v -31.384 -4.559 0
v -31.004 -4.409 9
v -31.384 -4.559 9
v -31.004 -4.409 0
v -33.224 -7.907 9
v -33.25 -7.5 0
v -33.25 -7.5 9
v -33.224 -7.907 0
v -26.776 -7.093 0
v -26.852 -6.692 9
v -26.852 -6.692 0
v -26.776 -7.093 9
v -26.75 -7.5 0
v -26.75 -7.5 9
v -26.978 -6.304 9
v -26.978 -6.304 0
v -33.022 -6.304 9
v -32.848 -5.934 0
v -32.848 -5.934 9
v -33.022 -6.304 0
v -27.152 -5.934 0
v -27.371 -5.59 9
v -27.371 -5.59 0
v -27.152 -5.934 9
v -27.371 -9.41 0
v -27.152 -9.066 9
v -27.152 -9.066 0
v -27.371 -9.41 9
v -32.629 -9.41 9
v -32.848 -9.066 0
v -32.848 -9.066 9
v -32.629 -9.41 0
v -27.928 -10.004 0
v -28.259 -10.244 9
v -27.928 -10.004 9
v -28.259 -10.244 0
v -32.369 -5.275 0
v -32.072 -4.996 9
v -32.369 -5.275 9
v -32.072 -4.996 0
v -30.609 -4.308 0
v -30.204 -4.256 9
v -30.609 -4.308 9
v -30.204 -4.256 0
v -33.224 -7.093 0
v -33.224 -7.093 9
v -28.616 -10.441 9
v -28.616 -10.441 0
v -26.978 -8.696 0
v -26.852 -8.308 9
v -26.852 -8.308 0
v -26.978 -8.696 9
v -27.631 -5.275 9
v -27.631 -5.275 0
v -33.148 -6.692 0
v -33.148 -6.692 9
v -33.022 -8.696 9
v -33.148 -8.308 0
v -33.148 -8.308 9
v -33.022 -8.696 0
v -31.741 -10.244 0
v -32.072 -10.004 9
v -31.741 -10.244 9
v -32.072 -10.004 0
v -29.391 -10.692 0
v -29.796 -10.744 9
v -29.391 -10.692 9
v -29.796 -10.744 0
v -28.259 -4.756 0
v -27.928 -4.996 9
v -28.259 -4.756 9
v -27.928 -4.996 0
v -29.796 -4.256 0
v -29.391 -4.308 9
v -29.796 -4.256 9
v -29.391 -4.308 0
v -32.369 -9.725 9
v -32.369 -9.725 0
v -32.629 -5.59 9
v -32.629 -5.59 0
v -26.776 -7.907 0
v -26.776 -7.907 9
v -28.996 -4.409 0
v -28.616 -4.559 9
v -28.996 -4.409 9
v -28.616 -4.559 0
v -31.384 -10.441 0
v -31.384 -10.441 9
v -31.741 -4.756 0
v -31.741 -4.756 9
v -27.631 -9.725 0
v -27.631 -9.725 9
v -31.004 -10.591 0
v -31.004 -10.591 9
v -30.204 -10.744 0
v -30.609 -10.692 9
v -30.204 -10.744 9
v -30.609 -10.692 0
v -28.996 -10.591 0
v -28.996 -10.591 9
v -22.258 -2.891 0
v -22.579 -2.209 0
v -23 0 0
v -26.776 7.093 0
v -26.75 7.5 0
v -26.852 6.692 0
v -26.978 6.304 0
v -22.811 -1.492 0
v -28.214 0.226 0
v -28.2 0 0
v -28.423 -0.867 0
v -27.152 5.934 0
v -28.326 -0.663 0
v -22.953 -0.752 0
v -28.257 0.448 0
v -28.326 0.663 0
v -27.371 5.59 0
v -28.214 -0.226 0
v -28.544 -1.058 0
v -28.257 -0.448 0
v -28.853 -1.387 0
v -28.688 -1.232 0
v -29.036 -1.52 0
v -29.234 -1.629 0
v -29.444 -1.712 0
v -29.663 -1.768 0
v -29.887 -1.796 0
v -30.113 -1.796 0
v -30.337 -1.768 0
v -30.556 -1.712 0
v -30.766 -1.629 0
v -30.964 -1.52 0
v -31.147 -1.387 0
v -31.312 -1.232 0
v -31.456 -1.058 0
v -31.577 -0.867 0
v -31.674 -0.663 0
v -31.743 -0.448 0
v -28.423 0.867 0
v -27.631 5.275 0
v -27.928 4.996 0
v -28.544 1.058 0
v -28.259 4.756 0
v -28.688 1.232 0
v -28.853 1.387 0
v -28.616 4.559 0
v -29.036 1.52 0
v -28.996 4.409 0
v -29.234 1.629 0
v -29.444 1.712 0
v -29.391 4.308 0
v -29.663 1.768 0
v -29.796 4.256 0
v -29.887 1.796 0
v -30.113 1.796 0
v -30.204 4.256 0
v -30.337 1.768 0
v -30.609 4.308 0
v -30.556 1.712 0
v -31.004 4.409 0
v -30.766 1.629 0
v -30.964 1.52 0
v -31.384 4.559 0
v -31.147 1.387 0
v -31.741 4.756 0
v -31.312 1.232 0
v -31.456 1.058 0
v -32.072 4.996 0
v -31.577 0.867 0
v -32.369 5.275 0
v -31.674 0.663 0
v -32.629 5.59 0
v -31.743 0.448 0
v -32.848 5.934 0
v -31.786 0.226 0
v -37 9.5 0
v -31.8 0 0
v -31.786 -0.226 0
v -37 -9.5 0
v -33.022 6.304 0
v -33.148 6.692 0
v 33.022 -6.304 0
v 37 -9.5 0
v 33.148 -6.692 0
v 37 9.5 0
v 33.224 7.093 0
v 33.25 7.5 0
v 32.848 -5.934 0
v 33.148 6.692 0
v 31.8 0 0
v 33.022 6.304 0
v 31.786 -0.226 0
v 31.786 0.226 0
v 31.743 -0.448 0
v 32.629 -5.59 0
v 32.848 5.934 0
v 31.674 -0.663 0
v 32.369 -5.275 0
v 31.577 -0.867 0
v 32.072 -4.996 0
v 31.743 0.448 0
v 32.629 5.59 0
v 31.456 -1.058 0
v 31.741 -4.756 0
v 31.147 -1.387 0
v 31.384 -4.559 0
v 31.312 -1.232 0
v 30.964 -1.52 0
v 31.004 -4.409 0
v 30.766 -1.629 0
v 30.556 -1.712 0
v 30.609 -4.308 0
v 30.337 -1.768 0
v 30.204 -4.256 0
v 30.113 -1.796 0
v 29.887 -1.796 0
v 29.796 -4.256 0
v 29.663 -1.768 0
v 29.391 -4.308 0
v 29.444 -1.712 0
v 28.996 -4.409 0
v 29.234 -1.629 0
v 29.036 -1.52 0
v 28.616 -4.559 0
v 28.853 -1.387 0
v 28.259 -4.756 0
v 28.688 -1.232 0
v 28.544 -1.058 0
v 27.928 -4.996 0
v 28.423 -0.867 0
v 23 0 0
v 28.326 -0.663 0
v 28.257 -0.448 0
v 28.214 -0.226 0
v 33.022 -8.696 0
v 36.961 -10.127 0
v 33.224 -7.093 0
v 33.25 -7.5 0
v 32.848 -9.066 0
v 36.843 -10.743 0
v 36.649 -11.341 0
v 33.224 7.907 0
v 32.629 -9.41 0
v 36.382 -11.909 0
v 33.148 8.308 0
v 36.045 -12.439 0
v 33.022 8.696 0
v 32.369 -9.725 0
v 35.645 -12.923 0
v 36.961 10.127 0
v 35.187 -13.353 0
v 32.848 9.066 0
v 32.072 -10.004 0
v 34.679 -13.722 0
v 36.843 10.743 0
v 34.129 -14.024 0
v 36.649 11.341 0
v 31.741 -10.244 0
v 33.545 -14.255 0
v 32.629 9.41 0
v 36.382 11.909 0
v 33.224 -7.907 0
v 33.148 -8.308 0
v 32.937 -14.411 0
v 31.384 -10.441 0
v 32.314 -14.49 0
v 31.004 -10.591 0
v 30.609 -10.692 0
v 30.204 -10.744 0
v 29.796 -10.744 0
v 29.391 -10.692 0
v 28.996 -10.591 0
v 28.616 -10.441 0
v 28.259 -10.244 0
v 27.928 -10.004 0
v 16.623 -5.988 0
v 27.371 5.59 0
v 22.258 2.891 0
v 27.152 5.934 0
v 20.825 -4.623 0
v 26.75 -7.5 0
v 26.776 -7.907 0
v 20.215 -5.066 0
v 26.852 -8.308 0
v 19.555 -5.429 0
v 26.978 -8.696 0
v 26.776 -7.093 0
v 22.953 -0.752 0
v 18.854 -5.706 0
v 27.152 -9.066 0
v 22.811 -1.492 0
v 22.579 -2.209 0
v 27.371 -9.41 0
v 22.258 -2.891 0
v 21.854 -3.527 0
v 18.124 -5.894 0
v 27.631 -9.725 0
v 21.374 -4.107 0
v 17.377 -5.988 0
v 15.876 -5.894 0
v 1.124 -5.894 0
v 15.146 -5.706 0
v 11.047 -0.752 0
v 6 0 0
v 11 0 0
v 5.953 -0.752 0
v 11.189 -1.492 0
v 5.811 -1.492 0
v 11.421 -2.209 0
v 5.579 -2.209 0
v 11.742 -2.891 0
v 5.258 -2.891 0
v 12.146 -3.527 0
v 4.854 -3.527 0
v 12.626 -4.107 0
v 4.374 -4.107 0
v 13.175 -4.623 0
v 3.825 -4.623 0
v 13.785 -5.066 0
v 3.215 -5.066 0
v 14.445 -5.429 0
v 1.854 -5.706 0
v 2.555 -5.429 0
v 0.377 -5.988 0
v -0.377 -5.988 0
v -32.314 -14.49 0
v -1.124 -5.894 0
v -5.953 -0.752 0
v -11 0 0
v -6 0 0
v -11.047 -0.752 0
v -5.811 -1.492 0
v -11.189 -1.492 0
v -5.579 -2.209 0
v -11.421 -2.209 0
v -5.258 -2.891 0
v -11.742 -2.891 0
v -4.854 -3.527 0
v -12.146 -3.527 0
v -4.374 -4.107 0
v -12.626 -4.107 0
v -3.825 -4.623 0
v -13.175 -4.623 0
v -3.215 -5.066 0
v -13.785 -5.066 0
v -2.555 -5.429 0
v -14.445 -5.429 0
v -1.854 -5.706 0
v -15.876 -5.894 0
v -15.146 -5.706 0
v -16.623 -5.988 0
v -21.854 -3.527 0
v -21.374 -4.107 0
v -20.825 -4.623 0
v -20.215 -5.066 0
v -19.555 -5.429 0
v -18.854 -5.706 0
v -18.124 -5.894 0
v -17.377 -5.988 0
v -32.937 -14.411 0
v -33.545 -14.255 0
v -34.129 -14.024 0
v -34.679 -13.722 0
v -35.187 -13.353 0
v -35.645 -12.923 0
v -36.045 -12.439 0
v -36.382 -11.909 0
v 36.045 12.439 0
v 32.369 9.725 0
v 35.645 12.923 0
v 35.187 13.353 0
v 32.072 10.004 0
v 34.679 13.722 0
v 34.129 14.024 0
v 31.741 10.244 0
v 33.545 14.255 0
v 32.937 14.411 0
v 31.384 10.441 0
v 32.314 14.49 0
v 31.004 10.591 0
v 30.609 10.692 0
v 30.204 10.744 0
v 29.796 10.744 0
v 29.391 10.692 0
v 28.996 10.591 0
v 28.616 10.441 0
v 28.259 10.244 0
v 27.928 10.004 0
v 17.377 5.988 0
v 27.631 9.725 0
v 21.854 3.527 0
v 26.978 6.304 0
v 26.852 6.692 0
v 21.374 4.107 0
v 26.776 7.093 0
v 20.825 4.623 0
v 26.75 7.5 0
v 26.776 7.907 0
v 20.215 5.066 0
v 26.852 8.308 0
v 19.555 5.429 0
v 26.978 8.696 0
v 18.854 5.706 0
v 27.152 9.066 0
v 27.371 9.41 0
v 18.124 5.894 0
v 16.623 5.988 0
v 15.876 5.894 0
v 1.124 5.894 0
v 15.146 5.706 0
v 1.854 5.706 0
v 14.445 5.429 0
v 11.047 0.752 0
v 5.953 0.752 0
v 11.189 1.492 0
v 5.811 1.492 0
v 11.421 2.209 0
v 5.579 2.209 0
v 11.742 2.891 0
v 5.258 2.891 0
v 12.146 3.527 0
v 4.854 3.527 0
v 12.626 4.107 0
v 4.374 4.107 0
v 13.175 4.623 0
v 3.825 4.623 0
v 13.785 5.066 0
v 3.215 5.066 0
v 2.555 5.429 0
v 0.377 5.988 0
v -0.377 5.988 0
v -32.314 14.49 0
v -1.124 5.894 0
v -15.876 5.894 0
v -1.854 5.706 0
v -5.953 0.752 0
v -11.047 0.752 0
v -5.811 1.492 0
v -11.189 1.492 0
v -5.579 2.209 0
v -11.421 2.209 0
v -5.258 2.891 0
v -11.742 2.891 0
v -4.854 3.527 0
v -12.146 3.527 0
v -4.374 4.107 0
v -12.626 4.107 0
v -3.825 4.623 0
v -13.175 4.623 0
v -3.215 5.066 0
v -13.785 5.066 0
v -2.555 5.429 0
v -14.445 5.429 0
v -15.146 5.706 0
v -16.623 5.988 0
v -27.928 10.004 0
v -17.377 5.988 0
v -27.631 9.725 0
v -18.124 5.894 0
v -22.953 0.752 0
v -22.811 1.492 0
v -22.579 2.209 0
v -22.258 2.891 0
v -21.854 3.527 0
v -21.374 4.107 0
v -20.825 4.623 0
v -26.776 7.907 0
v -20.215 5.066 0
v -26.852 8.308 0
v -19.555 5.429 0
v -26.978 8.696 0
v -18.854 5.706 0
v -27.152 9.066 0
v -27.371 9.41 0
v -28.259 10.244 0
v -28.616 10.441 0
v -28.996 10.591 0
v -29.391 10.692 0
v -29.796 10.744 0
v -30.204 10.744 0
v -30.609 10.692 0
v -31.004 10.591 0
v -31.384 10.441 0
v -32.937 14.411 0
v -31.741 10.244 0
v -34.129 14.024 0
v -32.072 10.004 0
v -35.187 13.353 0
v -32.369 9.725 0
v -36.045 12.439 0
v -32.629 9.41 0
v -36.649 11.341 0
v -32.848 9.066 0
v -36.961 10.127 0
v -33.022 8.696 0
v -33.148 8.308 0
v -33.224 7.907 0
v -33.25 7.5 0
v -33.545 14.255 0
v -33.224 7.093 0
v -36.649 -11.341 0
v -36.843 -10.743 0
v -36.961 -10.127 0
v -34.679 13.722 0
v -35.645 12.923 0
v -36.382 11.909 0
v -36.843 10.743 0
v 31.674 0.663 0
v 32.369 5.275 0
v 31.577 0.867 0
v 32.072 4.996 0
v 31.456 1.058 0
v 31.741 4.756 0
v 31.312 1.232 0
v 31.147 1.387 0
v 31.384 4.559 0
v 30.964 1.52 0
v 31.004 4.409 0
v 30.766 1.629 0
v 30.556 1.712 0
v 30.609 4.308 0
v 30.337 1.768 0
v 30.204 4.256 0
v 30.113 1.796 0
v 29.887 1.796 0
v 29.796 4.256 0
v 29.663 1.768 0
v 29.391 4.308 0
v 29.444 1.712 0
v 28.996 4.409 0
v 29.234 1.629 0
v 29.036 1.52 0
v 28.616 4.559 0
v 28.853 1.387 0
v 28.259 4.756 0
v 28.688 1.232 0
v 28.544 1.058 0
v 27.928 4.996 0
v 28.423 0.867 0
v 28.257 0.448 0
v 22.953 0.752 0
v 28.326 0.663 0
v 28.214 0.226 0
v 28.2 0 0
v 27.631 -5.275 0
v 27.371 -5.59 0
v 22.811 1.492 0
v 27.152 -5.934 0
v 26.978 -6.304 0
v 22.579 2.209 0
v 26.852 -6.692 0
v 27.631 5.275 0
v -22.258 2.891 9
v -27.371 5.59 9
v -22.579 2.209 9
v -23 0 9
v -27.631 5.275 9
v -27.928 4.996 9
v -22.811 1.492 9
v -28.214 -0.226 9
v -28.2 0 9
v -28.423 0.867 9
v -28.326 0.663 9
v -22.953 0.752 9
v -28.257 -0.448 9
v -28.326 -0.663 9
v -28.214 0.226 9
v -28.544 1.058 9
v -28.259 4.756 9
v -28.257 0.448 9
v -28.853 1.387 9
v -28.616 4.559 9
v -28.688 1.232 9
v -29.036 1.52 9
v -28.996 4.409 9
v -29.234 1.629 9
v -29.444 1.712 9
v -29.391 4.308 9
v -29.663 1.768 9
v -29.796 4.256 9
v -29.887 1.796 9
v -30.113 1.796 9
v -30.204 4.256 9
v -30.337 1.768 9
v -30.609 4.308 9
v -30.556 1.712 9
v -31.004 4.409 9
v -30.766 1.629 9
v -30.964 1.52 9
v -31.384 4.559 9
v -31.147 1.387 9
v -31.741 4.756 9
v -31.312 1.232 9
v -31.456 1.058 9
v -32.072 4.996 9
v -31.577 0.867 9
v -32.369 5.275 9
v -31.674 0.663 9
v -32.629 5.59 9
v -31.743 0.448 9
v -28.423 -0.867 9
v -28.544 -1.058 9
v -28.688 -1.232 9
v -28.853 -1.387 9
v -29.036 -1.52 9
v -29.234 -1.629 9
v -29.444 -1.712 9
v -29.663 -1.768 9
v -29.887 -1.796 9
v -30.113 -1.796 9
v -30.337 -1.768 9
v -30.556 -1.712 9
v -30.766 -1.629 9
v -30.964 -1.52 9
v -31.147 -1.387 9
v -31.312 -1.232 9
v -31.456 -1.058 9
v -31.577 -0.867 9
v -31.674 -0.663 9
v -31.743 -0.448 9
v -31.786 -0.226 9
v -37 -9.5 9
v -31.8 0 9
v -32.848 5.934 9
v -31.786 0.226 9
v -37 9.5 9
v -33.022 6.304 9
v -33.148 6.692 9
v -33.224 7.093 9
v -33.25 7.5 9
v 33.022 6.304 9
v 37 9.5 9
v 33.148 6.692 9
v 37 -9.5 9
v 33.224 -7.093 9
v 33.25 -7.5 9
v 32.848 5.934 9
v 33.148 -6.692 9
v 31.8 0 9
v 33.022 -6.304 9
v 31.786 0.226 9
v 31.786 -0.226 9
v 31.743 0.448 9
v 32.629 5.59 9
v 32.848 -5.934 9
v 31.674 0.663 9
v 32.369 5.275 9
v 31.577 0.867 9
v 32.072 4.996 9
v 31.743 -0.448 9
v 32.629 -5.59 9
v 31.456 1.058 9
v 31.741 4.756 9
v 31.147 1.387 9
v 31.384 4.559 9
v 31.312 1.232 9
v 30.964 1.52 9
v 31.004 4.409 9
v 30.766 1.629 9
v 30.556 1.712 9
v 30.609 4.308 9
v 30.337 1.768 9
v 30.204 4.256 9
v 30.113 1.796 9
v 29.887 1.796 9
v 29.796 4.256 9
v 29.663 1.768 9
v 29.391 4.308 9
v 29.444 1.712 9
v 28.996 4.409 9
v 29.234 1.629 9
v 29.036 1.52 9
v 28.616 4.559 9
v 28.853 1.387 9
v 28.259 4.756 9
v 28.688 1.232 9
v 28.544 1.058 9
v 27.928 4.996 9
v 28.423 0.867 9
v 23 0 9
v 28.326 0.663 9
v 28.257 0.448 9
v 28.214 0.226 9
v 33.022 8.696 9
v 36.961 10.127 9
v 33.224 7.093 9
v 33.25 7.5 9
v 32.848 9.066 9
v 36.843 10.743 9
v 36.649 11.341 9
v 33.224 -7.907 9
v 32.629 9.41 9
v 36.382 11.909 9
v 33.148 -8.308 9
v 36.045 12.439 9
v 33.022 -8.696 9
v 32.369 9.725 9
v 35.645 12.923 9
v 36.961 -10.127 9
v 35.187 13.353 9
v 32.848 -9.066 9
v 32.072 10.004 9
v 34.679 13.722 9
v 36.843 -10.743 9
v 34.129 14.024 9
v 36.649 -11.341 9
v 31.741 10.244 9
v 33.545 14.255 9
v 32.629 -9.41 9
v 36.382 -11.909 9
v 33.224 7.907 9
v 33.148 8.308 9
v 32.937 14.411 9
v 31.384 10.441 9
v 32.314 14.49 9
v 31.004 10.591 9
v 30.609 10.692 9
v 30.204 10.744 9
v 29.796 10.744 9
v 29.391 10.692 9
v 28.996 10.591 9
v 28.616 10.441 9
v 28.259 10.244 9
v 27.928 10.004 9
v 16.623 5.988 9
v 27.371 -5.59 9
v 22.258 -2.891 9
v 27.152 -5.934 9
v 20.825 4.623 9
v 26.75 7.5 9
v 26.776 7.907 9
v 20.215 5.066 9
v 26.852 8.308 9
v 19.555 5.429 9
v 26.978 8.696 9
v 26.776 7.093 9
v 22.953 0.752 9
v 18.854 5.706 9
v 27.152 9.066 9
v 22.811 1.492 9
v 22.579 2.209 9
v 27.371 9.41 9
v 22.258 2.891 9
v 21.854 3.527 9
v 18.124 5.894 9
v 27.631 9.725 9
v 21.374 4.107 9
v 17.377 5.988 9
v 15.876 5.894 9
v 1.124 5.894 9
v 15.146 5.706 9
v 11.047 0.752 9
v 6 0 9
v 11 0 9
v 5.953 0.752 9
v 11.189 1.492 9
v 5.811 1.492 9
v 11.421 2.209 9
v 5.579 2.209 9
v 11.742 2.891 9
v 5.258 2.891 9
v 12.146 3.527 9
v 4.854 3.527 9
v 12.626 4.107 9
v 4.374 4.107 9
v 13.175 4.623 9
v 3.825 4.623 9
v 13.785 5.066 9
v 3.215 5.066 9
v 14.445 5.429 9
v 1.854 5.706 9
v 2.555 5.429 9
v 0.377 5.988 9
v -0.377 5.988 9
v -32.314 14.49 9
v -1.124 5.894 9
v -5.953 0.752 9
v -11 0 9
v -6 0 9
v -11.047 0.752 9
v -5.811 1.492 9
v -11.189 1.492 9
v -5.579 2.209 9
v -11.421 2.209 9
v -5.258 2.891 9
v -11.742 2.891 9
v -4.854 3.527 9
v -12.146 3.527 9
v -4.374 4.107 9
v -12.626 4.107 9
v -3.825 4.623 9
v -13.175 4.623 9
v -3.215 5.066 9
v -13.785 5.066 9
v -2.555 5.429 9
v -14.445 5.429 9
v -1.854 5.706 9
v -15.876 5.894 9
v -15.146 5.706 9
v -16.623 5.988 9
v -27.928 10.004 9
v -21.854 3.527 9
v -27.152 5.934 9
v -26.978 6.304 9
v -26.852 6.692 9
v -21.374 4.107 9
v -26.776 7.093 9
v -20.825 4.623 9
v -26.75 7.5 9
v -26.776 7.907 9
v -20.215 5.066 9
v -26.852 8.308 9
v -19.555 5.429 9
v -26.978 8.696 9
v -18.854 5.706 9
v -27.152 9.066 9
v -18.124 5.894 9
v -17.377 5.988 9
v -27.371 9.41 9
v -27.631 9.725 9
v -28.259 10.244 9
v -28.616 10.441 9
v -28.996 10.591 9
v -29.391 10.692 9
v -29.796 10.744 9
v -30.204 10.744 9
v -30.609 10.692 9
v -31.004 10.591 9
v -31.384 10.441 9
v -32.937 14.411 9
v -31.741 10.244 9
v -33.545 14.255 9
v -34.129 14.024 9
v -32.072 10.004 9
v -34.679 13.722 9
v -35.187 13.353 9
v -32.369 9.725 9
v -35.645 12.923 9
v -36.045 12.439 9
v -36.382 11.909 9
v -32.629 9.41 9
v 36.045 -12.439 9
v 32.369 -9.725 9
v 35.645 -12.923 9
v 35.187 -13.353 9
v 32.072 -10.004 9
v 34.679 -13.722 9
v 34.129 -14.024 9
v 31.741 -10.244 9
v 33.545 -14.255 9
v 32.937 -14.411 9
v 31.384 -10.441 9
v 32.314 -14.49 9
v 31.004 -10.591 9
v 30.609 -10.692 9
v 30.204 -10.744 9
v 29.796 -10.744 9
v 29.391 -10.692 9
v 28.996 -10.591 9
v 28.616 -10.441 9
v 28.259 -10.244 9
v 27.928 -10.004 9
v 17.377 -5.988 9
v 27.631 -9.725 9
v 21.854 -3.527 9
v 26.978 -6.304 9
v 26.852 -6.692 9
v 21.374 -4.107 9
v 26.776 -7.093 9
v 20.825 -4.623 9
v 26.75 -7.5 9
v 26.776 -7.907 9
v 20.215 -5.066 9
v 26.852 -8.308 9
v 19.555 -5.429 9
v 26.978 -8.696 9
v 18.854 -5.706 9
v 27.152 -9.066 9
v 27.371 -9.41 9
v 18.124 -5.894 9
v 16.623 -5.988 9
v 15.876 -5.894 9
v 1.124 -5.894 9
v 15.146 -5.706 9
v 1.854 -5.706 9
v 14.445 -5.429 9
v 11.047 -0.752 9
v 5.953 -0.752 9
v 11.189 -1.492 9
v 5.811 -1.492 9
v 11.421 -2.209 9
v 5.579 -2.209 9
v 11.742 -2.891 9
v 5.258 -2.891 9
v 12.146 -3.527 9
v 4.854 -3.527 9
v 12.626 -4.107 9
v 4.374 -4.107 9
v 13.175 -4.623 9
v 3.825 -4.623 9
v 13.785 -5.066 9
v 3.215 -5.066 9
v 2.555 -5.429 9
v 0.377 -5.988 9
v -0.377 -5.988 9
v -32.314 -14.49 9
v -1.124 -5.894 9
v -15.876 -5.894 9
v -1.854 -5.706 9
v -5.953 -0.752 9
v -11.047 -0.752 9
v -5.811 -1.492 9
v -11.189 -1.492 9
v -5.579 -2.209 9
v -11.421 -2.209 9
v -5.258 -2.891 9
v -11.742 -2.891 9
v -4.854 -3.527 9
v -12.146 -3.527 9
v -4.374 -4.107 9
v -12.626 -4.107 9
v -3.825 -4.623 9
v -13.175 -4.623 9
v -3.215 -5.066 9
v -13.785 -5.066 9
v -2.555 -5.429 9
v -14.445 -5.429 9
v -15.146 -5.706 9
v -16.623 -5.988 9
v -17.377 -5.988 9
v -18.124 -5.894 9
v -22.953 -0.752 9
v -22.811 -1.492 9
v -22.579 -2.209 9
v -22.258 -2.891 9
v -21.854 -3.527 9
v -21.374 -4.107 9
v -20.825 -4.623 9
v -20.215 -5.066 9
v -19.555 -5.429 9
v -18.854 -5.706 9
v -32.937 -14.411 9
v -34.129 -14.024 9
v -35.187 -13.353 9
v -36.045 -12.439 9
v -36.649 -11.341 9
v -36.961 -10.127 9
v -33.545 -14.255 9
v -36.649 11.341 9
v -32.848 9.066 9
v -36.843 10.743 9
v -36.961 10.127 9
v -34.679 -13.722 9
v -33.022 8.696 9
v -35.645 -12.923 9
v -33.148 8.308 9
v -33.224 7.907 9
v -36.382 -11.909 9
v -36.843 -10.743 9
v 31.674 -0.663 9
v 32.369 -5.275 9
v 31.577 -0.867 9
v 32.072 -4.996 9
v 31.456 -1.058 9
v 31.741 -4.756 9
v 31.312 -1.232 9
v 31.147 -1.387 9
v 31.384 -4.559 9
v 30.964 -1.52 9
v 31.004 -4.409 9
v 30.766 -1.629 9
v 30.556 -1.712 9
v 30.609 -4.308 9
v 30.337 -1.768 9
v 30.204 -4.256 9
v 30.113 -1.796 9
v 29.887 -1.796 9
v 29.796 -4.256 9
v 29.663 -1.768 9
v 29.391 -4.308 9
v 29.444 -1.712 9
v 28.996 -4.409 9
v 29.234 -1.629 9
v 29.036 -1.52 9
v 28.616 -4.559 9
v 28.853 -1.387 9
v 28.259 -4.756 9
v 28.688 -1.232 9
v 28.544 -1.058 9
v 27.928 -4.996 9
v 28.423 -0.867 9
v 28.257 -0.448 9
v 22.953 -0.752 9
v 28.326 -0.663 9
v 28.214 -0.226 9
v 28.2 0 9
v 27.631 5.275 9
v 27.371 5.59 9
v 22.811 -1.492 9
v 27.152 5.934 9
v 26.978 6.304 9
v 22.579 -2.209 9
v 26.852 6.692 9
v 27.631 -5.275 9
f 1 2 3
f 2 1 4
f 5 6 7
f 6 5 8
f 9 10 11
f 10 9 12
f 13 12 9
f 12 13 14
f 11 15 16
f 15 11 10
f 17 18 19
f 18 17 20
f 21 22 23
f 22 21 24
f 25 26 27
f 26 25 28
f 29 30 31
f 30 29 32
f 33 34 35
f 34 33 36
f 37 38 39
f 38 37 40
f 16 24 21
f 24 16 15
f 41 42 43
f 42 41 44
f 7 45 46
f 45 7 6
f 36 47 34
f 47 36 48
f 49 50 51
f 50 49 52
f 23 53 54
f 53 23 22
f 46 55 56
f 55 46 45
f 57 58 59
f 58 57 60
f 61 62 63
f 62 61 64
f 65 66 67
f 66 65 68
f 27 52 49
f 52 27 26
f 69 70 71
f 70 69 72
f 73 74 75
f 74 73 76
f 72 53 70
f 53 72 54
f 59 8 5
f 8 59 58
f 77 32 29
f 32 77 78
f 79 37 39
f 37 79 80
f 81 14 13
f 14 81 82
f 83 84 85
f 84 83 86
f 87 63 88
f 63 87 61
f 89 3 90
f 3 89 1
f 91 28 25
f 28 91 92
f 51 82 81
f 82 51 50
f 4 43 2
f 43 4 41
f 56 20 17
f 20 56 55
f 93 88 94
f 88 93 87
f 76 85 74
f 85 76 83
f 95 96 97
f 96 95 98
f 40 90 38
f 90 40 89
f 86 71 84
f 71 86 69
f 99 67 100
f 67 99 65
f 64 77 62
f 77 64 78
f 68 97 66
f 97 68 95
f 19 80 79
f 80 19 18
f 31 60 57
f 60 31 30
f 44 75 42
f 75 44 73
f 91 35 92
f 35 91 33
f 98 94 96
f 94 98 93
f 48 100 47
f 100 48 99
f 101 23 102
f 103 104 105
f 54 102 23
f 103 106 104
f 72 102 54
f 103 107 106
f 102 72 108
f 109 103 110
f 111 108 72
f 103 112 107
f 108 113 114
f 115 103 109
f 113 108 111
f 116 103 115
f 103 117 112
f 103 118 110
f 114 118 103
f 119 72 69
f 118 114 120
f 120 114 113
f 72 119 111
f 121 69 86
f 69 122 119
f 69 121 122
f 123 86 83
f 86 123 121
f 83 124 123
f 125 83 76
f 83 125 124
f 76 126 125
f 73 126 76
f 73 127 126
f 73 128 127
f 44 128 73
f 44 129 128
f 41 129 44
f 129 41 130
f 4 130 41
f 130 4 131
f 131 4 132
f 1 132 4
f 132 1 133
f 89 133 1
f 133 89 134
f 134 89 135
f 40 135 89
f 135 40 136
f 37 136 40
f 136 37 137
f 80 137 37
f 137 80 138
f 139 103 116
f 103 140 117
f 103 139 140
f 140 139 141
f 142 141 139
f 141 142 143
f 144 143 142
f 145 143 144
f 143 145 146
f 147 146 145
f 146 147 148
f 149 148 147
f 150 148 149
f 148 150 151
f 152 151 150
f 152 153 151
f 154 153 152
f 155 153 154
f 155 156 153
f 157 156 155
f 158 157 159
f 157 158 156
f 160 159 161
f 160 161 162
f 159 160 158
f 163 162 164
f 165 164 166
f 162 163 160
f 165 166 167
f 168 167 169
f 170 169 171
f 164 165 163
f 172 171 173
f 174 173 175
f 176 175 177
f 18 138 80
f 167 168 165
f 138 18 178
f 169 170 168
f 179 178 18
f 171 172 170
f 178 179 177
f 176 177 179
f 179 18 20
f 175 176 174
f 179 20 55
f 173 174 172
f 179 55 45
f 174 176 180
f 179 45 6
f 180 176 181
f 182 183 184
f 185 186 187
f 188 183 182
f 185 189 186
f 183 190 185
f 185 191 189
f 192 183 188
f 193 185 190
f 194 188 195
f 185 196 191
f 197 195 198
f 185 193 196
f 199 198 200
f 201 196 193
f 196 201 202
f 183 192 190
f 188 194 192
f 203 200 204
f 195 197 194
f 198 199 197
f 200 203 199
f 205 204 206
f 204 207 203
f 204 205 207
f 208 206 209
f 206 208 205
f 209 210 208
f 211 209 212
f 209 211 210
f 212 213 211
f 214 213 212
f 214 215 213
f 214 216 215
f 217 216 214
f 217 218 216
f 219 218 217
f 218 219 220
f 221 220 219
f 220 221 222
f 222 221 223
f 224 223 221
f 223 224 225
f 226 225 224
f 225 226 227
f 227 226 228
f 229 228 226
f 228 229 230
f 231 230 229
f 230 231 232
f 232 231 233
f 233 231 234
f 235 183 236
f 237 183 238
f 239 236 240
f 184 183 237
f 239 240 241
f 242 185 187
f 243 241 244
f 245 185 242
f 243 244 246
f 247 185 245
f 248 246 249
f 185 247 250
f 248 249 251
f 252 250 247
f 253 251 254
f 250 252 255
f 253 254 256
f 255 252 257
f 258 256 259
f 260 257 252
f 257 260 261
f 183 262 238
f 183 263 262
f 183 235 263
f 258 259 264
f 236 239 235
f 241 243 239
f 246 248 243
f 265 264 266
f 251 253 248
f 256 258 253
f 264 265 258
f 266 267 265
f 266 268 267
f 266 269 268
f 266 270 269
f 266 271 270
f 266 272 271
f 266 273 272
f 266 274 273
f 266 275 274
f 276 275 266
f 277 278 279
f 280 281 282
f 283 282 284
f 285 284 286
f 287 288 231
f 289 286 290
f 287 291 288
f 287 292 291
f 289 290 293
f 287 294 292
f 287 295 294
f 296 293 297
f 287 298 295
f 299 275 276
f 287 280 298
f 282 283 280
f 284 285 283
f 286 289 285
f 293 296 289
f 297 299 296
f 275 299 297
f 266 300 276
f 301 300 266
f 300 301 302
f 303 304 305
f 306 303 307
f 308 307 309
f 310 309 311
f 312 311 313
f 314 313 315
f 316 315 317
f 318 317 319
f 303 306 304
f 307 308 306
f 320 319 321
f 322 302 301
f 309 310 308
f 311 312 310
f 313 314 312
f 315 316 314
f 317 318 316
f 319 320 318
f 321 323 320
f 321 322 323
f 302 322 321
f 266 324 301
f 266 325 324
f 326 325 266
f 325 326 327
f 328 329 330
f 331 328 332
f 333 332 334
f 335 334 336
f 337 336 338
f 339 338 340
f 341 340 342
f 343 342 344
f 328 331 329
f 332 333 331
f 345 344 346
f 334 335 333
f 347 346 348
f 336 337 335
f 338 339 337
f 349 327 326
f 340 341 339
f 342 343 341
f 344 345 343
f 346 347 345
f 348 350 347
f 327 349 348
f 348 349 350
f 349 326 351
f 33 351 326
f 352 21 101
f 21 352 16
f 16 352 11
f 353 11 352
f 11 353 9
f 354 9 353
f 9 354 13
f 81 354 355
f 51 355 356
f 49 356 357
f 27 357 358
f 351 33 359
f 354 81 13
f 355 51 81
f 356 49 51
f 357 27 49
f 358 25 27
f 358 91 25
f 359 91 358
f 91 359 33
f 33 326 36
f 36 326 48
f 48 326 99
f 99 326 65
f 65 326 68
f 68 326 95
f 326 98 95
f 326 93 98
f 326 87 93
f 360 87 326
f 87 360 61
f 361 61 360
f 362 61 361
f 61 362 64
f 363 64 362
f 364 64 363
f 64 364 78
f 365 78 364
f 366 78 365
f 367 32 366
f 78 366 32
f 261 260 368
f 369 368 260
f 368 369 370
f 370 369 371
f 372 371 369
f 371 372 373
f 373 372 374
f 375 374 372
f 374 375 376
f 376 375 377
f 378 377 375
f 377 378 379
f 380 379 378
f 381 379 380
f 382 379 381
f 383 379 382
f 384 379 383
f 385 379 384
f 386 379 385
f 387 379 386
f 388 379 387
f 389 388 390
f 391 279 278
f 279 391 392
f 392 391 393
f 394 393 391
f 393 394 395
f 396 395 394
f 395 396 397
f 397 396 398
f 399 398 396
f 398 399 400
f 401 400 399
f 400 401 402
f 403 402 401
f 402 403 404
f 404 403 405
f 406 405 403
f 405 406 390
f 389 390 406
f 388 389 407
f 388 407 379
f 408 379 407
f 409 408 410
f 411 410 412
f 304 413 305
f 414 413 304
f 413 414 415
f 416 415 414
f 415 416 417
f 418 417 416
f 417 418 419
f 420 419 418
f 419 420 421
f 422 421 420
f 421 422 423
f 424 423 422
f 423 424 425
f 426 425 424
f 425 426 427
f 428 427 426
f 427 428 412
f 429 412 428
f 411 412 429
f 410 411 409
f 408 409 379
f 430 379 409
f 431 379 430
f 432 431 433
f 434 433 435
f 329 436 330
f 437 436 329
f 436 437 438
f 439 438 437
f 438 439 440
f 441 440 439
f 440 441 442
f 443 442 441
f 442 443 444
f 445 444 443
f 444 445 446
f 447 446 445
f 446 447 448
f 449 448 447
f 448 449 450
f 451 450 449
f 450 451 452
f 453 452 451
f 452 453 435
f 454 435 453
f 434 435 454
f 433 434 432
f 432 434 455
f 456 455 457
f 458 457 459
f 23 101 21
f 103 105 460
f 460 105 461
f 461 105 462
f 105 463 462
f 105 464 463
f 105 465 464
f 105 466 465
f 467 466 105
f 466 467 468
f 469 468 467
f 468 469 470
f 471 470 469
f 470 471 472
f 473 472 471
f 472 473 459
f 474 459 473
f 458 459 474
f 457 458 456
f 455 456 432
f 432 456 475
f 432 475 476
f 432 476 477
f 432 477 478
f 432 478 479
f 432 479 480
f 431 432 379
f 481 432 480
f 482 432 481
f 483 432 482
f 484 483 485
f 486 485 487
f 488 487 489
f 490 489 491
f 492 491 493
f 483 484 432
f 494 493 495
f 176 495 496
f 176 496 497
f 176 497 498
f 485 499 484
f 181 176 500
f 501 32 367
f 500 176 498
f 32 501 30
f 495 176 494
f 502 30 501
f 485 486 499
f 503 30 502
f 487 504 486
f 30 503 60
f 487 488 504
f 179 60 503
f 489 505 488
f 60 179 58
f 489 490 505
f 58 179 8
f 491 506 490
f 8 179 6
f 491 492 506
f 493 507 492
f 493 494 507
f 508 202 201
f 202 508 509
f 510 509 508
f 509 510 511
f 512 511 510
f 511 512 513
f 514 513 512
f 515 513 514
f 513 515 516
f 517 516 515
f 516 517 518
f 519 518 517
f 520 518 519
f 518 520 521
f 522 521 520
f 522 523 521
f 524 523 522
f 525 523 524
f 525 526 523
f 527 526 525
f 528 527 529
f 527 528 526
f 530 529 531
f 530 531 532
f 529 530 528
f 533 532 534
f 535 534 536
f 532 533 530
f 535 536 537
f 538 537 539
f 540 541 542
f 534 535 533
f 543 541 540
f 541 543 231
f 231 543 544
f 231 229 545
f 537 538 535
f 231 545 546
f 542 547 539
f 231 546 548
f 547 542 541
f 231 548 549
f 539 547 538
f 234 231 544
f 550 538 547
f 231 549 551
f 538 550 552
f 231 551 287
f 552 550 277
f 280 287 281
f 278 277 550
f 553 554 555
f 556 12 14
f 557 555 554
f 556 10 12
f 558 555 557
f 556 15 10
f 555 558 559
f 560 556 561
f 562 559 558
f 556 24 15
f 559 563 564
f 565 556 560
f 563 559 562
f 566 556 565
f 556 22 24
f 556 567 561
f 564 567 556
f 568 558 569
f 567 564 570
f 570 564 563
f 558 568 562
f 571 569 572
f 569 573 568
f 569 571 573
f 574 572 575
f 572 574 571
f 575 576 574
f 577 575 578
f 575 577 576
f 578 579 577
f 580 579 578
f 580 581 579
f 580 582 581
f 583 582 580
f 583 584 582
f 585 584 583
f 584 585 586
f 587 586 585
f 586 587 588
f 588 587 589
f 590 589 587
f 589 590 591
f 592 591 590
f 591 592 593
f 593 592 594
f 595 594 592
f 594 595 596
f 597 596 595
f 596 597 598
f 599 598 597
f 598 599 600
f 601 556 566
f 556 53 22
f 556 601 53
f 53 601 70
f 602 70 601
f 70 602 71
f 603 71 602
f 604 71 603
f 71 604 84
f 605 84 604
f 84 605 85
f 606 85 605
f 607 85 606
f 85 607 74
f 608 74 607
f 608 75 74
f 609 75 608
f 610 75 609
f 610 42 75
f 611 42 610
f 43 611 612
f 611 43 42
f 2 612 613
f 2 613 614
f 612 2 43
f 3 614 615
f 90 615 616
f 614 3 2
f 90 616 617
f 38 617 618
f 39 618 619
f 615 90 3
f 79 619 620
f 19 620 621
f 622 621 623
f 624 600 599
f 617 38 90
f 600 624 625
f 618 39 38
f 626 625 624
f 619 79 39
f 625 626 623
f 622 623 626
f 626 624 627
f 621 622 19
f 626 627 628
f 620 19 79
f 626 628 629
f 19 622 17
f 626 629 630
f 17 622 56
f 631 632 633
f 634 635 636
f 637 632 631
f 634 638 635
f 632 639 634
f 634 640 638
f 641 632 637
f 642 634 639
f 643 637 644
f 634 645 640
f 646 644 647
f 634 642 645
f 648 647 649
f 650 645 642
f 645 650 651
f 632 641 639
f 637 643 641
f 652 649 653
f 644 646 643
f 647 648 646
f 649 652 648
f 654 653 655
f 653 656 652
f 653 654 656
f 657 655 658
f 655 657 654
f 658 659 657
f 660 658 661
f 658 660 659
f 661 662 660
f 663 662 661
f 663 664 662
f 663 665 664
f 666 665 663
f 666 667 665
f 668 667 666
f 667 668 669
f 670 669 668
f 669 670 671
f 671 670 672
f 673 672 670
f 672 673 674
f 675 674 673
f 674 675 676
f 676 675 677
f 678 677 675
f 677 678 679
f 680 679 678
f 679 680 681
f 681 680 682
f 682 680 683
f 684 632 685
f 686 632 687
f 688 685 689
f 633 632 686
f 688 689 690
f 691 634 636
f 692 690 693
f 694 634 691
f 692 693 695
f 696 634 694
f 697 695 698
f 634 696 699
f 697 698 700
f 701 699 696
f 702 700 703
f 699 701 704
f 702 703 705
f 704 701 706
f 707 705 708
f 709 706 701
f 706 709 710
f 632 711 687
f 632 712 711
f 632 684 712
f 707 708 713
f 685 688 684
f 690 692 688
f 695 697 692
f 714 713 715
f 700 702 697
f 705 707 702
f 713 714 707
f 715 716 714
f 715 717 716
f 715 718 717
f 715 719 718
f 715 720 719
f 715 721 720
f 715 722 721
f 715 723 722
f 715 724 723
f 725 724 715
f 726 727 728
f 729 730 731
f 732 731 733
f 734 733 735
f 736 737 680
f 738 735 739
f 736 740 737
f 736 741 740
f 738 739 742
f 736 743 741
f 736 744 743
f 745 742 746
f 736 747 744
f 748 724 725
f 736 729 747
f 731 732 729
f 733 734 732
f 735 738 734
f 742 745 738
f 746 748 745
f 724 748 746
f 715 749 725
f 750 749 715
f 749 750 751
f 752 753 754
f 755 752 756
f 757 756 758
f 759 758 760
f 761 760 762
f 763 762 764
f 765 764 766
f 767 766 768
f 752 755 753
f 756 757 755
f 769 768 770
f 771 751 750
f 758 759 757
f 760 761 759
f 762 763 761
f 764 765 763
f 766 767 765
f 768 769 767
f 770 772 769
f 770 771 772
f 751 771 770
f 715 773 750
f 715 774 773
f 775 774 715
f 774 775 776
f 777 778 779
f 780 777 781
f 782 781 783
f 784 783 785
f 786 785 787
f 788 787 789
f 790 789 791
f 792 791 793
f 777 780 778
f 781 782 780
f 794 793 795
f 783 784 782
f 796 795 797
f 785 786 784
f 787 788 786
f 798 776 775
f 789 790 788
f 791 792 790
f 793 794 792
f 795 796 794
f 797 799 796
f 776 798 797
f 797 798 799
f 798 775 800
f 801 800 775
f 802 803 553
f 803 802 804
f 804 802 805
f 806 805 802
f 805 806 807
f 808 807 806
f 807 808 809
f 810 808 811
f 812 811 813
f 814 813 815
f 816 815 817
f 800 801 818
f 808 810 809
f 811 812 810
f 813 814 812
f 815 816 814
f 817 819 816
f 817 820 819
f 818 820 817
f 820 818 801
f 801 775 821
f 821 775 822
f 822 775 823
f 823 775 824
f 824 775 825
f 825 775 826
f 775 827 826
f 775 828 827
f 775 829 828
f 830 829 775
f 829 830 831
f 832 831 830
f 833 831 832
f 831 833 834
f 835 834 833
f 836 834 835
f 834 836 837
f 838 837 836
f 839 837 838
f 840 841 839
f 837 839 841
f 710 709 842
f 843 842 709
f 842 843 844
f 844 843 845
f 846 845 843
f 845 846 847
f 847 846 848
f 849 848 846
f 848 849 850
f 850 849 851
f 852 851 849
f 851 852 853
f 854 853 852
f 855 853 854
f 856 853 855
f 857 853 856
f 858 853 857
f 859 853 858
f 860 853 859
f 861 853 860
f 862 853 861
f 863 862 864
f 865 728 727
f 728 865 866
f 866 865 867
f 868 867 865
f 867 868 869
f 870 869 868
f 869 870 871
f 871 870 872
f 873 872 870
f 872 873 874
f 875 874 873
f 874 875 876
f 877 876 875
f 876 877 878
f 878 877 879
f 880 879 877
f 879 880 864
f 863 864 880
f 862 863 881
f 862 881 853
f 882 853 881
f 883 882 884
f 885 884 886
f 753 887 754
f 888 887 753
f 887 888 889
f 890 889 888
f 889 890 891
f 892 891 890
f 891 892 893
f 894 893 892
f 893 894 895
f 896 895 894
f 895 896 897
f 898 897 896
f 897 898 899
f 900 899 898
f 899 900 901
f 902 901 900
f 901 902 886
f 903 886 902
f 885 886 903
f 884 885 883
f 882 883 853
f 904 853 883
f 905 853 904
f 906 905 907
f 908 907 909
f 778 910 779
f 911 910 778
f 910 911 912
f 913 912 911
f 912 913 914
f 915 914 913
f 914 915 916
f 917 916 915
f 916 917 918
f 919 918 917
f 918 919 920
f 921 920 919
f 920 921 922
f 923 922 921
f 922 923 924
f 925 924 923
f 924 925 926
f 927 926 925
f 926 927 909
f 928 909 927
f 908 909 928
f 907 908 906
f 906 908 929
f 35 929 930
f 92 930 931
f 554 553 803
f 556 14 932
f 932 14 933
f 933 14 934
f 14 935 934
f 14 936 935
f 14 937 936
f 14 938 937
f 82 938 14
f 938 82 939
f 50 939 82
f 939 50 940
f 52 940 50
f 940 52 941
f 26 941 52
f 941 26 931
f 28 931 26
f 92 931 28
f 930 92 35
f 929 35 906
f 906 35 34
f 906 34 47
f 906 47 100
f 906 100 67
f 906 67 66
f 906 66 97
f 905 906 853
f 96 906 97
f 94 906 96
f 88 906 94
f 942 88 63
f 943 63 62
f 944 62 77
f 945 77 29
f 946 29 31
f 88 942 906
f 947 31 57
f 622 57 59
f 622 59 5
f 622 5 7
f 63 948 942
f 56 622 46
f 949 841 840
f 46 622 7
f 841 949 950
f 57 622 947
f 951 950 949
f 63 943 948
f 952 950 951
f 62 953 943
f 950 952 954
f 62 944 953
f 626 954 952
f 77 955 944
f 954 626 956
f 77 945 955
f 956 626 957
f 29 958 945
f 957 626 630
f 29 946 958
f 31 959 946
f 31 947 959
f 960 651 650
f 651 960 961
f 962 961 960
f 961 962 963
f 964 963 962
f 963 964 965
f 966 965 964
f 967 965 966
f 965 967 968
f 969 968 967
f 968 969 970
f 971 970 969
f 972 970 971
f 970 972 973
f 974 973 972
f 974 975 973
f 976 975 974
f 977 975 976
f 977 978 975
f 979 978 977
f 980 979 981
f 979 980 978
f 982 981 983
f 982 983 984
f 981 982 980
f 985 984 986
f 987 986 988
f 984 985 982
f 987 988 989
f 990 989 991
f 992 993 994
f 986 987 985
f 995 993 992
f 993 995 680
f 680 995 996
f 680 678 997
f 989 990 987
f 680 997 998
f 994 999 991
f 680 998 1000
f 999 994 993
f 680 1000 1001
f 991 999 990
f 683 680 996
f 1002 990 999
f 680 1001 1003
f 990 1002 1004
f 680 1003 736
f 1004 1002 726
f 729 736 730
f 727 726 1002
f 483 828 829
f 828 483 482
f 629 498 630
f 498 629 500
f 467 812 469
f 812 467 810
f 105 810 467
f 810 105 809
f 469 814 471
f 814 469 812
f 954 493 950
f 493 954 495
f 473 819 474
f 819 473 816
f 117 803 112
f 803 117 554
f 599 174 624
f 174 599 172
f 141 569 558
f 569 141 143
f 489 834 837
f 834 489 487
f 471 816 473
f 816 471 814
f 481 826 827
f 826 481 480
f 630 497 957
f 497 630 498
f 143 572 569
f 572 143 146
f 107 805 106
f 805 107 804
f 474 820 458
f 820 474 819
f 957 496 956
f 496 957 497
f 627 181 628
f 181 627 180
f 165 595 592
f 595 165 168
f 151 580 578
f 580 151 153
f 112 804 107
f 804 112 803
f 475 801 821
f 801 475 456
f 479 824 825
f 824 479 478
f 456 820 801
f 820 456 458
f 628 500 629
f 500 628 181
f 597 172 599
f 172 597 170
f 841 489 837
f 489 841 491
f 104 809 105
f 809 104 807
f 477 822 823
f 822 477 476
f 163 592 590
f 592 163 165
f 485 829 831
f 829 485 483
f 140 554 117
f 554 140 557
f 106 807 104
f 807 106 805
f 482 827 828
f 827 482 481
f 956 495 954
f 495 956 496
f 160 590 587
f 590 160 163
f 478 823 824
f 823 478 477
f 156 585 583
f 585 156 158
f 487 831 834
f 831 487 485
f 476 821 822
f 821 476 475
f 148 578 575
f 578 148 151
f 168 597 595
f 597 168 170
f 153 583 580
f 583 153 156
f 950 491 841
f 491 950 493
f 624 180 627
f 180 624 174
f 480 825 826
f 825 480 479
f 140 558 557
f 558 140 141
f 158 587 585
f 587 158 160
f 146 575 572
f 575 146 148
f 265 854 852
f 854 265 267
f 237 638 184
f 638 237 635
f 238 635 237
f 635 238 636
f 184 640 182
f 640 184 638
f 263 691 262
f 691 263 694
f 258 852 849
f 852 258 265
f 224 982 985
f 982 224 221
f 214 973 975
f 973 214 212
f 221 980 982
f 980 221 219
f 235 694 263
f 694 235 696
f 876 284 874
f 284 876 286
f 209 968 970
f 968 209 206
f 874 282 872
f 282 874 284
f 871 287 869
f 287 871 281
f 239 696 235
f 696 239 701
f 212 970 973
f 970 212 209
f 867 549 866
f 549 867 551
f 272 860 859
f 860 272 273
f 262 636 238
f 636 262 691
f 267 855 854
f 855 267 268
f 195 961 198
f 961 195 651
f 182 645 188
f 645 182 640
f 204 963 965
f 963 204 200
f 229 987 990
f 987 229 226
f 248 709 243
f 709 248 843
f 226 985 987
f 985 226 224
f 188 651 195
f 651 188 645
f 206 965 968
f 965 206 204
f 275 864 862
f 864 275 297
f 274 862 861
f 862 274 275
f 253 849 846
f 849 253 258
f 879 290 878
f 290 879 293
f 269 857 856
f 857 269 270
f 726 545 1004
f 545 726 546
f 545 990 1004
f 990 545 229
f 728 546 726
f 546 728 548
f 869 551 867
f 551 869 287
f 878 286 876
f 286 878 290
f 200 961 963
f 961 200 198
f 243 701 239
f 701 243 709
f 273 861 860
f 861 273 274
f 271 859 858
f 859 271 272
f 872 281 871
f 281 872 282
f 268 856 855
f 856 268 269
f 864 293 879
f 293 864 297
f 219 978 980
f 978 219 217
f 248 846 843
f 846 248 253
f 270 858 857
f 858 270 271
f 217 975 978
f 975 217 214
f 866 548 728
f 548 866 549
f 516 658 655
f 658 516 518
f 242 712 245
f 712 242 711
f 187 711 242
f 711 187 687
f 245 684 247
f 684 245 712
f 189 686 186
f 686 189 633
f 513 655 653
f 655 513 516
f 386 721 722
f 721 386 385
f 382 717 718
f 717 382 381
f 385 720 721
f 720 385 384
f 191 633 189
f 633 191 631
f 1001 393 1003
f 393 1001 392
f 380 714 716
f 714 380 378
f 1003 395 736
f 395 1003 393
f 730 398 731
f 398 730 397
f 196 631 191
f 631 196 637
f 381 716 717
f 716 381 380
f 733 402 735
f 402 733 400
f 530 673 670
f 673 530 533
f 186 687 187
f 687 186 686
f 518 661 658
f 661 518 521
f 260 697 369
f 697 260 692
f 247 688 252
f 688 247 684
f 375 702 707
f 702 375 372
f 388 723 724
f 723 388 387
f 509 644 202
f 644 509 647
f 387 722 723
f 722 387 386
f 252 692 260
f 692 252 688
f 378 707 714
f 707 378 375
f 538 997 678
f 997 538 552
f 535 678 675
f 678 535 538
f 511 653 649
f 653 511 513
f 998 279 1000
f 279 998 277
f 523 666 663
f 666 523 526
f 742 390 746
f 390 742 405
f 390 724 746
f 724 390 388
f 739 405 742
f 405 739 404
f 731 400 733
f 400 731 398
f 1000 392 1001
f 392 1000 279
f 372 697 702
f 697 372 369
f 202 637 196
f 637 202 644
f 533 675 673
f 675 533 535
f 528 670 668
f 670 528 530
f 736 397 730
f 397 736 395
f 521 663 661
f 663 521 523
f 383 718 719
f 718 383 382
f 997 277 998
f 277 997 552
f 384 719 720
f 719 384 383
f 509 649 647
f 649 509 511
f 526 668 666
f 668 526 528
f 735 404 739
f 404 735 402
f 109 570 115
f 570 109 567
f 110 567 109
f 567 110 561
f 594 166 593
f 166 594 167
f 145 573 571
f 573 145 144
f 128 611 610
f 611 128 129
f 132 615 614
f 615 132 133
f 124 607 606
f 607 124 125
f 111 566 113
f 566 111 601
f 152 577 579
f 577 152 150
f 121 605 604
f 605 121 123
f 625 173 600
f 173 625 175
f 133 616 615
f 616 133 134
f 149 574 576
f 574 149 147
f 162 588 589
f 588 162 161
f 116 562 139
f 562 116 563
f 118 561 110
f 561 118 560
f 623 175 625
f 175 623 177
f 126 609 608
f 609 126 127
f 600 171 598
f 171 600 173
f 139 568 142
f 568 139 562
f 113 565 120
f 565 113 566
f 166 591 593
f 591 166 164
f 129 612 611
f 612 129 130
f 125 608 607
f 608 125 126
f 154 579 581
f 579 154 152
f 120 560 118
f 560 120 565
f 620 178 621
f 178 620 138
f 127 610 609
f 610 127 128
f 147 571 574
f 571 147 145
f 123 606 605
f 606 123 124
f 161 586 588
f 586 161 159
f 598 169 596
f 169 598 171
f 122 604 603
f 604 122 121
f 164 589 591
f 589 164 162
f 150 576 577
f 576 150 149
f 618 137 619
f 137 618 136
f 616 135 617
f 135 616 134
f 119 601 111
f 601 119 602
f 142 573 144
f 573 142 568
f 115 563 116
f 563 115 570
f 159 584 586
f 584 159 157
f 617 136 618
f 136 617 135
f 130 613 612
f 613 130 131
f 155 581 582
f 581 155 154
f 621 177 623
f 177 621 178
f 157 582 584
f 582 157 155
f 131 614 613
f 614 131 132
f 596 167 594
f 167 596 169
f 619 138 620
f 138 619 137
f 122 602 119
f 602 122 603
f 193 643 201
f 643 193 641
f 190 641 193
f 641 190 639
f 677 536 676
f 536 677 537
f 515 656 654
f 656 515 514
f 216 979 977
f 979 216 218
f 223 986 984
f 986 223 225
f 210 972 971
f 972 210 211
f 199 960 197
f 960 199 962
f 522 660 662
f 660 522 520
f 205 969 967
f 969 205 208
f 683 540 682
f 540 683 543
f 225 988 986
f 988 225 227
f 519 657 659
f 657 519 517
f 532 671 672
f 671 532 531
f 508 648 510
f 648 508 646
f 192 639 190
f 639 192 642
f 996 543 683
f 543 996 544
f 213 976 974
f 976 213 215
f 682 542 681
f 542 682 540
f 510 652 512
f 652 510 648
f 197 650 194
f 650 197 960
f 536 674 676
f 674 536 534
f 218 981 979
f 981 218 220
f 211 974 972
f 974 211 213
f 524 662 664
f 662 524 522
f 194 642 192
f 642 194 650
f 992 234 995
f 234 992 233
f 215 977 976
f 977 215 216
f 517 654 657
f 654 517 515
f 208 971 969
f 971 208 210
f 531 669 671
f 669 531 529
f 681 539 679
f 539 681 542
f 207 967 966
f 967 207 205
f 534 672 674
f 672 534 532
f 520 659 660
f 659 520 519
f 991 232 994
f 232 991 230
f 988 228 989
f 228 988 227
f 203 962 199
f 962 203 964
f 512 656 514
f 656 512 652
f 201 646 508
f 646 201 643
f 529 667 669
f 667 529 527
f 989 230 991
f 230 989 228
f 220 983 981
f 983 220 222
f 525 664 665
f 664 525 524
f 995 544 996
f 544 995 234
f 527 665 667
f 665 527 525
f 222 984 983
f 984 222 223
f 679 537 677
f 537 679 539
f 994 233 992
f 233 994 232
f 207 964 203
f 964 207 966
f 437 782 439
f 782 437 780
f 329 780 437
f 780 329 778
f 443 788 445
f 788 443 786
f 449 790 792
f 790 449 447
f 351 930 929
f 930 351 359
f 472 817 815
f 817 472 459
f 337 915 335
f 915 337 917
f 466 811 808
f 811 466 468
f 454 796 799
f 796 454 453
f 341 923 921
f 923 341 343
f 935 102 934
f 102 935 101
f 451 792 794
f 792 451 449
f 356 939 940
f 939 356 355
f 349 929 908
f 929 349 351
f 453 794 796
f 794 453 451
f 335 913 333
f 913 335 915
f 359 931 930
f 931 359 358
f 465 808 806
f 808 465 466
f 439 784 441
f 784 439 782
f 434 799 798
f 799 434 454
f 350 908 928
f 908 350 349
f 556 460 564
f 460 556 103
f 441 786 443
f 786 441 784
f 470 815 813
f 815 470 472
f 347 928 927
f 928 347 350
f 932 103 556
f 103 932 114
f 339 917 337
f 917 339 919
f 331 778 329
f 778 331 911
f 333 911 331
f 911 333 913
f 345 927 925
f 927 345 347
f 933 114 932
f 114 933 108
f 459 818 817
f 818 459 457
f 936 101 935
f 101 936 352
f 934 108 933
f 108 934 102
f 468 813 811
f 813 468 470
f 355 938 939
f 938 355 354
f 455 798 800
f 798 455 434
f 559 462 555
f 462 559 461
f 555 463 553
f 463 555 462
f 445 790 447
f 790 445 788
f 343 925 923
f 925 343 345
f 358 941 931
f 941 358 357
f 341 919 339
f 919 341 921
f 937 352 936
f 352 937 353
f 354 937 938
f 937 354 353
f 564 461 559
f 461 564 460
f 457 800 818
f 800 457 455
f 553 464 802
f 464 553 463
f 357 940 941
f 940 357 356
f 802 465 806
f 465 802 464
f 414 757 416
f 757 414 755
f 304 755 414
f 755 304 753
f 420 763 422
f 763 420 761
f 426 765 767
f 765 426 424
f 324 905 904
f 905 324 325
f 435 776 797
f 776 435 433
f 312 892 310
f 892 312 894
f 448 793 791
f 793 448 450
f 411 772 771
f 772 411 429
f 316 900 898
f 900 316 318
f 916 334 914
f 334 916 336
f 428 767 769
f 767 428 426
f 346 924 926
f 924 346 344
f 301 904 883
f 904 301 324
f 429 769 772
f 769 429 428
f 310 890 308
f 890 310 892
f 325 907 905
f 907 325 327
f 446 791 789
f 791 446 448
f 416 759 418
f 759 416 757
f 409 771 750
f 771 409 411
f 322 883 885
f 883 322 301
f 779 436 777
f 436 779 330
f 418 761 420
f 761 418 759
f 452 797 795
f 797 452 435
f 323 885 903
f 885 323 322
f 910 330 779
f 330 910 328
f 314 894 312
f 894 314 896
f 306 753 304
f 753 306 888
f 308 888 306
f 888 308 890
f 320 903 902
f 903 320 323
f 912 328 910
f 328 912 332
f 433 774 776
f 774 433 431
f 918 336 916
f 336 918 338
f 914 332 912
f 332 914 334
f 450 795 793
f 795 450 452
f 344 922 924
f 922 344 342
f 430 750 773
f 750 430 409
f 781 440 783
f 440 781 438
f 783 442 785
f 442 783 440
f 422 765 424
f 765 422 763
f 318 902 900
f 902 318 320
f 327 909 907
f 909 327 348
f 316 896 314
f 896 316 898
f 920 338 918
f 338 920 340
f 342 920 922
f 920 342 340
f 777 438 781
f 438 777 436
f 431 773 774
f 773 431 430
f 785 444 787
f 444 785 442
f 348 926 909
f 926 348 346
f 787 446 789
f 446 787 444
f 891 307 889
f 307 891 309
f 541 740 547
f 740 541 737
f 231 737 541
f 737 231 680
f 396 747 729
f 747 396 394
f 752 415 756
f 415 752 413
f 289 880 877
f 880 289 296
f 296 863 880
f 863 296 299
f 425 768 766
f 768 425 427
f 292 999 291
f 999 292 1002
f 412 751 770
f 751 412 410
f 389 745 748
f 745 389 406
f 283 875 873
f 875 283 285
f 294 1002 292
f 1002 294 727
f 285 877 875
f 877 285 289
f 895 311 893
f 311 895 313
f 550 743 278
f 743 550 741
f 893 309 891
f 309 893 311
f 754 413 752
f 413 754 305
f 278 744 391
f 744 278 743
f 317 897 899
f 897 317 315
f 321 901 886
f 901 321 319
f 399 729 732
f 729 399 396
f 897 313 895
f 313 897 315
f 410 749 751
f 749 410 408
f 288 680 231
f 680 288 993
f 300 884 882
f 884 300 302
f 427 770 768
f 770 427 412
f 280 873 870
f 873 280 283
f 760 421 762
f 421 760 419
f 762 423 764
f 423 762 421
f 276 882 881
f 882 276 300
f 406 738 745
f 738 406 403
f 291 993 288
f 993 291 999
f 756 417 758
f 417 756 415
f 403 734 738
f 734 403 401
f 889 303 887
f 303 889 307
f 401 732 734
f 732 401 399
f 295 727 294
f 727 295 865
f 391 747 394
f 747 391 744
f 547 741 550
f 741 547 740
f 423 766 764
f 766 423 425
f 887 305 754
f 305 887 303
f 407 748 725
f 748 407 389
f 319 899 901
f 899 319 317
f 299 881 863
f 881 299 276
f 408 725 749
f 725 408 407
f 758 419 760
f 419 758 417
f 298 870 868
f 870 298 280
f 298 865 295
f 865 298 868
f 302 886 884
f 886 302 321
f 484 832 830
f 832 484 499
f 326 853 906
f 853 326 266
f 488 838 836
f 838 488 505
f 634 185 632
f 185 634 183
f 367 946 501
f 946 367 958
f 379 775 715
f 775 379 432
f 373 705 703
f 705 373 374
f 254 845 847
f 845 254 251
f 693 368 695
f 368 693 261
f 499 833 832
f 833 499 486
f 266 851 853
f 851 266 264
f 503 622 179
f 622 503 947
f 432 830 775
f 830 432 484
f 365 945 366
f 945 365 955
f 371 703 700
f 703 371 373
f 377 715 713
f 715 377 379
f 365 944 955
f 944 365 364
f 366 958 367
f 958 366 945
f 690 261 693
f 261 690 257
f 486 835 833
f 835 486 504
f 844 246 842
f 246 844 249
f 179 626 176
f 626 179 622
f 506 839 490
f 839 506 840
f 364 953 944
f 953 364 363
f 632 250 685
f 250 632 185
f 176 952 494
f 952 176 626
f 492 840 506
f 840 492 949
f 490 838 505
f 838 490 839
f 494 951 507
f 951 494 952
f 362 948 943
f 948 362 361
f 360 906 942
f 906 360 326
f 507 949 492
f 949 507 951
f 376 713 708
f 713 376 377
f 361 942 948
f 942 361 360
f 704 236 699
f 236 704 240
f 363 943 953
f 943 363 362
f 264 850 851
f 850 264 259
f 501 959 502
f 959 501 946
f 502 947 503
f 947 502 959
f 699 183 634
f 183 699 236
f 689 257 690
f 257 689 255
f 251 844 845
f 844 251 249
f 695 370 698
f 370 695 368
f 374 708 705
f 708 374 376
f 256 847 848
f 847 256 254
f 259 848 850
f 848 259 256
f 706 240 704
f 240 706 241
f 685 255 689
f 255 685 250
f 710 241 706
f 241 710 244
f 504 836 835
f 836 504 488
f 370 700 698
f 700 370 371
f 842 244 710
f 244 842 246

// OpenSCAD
$fn = 50;

difference() {
	union() {
		hull() {
			translate(v = [-32.0, 9.5, 0]) {
				cylinder(h = 9, r = 5);
			}
			translate(v = [32.0, 9.5, 0]) {
				cylinder(h = 9, r = 5);
			}
			translate(v = [-32.0, -9.5, 0]) {
				cylinder(h = 9, r = 5);
			}
			translate(v = [32.0, -9.5, 0]) {
				cylinder(h = 9, r = 5);
			}
		}
	}
	union() {
		translate(v = [-30.0, -7.5, 0]) {
			cylinder(h = 9, r = 3.25);
		}
		translate(v = [-30.0, 7.5, 0]) {
			cylinder(h = 9, r = 3.25);
		}
		translate(v = [30.0, -7.5, 0]) {
			cylinder(h = 9, r = 3.25);
		}
		translate(v = [30.0, 7.5, 0]) {
			cylinder(h = 9, r = 3.25);
		}
		translate(v = [-30.0, 0.0, 0]) {
			cylinder(h = 9, r = 1.8);
		}
		translate(v = [30.0, 0.0, 0]) {
			cylinder(h = 9, r = 1.8);
		}
		translate(v = [-17.0, 0, 0.0]) {
			cylinder(h = 9, r = 6.0);
		}
		cylinder(h = 9, r = 6.0);
		translate(v = [17.0, 0, 0.0]) {
			cylinder(h = 9, r = 6.0);
		}
	}
}
